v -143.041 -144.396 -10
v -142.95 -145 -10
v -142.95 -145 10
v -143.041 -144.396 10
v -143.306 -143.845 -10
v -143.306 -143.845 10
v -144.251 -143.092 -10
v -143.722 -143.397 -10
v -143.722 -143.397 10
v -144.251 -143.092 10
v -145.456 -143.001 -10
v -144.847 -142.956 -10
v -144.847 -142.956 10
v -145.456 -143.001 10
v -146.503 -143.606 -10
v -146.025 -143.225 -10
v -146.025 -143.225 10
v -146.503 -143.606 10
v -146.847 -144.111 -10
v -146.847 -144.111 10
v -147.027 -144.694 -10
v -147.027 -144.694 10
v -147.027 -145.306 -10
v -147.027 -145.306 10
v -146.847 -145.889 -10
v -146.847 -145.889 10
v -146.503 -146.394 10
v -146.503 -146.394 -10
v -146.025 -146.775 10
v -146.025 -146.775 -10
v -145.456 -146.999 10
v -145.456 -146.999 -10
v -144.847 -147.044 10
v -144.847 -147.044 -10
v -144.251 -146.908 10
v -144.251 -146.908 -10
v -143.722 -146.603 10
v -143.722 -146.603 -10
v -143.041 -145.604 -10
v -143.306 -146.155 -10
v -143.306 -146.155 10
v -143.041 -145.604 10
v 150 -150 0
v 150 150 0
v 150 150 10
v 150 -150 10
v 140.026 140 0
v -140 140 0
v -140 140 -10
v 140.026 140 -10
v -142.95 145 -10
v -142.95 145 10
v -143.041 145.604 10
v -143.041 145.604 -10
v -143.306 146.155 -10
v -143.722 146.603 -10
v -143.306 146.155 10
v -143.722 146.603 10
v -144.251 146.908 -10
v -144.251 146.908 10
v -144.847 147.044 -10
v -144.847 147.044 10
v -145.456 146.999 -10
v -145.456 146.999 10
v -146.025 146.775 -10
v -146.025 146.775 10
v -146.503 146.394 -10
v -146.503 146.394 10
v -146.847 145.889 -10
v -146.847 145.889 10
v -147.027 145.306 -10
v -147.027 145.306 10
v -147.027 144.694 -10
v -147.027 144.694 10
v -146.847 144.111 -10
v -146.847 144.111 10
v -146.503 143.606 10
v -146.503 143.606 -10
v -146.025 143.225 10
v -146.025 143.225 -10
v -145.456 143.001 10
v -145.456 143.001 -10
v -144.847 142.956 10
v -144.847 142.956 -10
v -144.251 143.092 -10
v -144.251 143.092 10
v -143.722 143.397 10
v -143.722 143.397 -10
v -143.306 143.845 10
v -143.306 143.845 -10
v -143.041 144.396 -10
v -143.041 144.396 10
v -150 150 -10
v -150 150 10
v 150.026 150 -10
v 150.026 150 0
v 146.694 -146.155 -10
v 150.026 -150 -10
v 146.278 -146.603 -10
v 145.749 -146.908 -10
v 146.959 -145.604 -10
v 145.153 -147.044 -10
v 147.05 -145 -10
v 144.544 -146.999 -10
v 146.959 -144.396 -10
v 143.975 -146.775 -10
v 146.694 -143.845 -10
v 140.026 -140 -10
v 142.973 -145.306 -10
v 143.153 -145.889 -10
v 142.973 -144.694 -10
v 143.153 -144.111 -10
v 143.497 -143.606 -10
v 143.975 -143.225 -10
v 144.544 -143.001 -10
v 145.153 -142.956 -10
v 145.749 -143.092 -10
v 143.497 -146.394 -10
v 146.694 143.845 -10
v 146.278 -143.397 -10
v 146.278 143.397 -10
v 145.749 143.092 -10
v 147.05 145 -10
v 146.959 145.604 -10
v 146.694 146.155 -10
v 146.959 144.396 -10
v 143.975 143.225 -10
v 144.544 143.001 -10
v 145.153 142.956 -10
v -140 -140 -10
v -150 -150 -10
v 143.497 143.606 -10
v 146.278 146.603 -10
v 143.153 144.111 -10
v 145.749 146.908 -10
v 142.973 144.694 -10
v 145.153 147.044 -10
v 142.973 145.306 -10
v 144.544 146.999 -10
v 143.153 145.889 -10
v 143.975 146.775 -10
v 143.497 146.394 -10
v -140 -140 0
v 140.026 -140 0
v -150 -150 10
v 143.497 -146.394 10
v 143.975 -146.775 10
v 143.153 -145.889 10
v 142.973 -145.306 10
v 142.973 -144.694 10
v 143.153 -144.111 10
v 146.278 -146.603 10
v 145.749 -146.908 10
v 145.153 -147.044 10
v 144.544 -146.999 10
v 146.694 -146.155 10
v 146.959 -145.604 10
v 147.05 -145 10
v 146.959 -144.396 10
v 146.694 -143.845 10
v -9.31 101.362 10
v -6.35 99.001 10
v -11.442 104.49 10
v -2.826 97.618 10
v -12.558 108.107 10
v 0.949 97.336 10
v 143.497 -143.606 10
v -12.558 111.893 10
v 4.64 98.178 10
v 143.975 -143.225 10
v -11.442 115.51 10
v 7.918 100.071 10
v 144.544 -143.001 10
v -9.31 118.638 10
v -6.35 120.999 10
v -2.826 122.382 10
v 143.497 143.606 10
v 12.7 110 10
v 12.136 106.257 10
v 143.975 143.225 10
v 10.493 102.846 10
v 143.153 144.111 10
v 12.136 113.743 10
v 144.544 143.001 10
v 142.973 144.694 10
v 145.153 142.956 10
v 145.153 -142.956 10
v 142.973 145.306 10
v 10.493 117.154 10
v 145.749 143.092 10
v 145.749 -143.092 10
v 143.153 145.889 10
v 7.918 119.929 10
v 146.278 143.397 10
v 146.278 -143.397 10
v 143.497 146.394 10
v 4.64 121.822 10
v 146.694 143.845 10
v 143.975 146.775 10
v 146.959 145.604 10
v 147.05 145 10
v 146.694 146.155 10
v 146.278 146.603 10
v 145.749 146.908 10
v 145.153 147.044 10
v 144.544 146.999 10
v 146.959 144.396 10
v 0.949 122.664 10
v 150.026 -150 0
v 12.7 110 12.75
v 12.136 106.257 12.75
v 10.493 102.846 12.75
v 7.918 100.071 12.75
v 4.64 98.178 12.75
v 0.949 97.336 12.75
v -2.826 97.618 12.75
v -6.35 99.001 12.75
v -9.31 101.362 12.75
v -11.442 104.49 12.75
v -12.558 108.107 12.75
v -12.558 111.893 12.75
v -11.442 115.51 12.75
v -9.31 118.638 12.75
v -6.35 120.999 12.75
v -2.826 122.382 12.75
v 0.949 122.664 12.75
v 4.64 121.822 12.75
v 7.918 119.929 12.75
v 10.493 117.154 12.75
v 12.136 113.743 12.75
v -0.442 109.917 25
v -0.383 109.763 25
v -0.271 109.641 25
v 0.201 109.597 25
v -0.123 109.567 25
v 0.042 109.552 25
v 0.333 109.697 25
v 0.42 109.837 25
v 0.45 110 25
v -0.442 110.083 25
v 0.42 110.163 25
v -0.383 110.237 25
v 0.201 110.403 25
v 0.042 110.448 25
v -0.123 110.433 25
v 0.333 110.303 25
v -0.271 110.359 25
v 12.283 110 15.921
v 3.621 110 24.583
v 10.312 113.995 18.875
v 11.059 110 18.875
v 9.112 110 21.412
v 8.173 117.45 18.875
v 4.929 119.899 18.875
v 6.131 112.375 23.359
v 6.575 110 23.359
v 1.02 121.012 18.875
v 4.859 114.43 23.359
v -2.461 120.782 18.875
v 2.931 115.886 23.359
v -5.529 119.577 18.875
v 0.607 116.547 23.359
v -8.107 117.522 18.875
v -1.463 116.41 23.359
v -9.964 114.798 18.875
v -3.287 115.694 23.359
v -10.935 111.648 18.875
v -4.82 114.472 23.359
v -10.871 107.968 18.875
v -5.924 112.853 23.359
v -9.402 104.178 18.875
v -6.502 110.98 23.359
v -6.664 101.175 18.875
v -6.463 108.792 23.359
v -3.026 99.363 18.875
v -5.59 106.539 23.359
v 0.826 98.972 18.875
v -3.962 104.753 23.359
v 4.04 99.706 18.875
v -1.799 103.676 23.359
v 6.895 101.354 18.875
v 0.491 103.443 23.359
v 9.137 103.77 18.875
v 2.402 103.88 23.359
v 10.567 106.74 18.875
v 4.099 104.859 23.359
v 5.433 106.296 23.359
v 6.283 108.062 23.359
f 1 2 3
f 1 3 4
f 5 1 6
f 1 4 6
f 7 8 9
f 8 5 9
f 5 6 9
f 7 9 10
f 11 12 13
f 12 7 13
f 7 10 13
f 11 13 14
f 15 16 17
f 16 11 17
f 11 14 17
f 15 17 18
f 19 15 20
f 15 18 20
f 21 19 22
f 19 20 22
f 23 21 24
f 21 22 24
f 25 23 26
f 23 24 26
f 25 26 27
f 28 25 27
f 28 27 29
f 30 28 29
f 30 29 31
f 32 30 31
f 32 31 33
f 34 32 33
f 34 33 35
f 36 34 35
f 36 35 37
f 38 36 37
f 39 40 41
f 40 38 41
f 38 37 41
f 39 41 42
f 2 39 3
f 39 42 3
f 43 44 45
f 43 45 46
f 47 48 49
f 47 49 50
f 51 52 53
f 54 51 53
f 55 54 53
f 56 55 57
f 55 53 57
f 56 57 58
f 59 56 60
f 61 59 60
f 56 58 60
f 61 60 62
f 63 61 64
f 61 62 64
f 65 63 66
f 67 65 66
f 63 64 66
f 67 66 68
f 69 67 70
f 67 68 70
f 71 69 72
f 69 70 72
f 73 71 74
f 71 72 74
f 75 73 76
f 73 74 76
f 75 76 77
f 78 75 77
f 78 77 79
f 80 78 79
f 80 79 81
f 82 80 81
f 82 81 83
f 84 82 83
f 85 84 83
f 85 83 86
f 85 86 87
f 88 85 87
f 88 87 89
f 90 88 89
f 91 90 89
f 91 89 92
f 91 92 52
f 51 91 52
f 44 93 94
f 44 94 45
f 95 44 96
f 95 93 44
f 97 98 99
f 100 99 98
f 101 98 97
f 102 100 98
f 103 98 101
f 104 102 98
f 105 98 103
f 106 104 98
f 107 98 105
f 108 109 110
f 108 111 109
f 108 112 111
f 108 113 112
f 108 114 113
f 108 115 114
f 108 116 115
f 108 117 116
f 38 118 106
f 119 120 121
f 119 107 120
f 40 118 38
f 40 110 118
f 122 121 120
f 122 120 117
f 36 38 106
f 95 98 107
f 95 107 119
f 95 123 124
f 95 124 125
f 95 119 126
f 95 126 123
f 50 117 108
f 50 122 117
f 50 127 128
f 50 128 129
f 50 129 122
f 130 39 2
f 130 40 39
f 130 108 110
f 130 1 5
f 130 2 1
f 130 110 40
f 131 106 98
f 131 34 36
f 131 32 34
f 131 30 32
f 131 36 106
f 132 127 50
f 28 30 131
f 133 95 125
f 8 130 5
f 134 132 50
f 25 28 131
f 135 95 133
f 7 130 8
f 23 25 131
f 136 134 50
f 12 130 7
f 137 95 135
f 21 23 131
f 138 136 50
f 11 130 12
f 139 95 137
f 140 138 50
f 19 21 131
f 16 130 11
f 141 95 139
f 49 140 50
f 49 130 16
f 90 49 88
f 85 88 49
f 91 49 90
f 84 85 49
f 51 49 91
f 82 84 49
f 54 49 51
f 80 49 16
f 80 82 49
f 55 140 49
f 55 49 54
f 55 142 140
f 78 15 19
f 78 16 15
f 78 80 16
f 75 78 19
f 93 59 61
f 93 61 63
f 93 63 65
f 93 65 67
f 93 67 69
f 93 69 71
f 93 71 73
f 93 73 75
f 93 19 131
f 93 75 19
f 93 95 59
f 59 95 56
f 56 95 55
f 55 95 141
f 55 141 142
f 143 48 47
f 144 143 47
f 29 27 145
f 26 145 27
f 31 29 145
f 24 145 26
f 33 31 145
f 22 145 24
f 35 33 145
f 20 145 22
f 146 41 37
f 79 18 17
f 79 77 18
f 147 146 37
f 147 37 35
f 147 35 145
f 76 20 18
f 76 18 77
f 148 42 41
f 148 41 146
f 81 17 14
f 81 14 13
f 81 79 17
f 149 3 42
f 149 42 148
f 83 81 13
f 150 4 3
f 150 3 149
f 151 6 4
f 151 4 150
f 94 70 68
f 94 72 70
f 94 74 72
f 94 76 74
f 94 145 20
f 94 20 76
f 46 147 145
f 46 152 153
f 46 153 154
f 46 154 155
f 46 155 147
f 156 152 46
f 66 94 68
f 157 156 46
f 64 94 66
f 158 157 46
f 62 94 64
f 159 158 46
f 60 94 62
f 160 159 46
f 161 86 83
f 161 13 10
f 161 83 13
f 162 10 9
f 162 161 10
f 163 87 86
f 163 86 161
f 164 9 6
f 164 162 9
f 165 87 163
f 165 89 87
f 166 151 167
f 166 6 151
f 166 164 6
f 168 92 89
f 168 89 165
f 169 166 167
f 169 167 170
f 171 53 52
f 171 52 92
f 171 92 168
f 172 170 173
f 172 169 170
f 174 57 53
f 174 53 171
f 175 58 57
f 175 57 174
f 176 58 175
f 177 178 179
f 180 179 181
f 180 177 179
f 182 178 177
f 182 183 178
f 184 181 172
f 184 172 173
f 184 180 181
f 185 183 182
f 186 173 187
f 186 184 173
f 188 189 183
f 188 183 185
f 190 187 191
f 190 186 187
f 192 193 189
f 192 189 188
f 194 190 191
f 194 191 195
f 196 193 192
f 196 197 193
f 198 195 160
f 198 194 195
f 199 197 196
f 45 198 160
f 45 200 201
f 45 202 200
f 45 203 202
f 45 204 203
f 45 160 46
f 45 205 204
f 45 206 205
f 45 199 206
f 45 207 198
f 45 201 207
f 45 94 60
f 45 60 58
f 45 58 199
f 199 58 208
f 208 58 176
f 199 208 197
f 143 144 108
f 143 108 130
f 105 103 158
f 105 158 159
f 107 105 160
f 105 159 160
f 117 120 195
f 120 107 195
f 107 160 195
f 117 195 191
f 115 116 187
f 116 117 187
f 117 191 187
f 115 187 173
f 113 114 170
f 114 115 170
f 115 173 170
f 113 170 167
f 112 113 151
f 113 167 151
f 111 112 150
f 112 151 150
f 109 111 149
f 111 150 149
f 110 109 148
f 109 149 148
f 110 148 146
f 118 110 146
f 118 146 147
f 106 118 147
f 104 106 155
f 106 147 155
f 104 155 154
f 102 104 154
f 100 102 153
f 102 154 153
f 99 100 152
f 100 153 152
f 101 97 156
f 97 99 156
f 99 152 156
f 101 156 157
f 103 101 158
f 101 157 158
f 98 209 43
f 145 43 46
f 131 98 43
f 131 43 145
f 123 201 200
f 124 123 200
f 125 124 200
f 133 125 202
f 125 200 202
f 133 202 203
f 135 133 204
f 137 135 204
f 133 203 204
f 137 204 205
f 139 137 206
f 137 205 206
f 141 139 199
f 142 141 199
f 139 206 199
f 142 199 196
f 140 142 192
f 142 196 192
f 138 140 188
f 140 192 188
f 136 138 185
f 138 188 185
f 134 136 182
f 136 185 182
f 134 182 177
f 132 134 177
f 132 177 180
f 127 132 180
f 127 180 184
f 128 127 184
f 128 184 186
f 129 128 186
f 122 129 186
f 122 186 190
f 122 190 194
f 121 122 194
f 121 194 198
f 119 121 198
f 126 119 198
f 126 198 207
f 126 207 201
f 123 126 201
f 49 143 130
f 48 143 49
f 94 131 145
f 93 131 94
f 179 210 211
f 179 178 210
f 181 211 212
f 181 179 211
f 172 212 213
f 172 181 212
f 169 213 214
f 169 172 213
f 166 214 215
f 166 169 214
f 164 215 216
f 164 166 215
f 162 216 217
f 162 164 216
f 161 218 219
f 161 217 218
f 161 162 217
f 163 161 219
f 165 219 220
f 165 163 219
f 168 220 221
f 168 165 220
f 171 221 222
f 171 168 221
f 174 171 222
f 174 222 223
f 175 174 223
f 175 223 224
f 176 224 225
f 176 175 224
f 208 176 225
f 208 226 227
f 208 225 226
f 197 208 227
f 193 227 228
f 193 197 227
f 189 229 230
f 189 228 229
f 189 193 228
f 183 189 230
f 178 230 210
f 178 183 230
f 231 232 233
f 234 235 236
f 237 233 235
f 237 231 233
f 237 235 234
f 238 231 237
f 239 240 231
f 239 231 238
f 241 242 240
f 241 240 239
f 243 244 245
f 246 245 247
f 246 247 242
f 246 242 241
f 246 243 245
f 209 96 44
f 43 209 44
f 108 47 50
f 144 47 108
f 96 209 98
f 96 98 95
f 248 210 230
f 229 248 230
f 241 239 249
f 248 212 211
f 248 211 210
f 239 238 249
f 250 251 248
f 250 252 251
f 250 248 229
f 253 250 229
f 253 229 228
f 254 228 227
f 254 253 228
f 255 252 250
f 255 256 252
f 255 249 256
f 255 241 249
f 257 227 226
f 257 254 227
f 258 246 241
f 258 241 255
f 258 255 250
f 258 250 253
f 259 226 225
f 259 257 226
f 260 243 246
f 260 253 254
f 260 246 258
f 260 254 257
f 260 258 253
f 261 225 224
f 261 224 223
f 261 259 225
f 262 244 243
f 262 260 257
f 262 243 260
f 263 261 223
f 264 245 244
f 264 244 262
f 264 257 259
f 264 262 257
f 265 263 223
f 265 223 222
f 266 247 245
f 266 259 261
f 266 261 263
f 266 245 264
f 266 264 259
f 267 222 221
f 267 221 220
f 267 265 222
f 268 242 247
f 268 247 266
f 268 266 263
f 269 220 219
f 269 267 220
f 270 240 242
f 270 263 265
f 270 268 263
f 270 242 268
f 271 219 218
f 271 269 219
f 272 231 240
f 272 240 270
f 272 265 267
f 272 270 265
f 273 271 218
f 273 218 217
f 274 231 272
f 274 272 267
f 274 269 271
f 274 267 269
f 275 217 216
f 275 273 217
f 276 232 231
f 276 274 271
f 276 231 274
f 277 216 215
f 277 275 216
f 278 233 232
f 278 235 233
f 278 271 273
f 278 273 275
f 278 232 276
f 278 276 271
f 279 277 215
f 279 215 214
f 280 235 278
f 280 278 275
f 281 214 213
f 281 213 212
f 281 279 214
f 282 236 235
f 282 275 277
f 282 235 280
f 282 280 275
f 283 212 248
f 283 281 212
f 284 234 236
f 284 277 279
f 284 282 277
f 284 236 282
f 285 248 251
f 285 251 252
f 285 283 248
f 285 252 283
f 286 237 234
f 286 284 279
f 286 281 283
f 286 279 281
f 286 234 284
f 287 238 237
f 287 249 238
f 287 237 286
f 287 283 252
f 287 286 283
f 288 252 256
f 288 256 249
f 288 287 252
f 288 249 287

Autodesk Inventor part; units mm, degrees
ref_plane "YZ Plane" through (0, 0, 0) normal (1, 0, 0) x (0, 1, 0)
ref_plane "XZ Plane" through (0, 0, 0) normal (0, 1, 0) x (-1, 0, 0)
ref_plane "XY Plane" through (0, 0, 0) normal (0, 0, 1) x (1, 0, 0)
sketch "Sketch1" plane through (0, 0, 0) normal (0, 0, 1) x (1, 0, 0)
  line L0 (-150, 150) -> (150, 150)
  line L1 (150, 150) -> (150, -150)
  line L2 (150, -150) -> (-150, -150)
  line L3 (-150, -150) -> (-150, 150)
  point P0 (0, 0)
  point P1 (0, 150)
  point P2 (150, 0)
  dimension "d0" = 300
  dimension "d1" = 300
extrude "Extrusion1" add sketch "Sketch1" along normal blind 10
sketch "Sketch2" plane through (0, 0, 0) normal (0, 0, -1) x (-1, 0, 0)
  line L0 (150, -150) -> (-150.0258, -150)
  line L1 (-150.0258, -150) -> (-150.0258, 150)
  line L2 (-150.0258, 150) -> (150, 150)
  line L3 (150, 150) -> (150, -150)
  line L4 (-140.0258, -140) -> (140, -140)
  line L5 (140, -140) -> (140, 140)
  line L6 (140, 140) -> (-140.0258, 140)
  line L7 (-140.0258, 140) -> (-140.0258, -140)
  point P0 (0, 0)
  dimension "d4" = 10
extrude "Extrusion2" add sketch "Sketch2" along normal blind 10
sketch "Sketch3" plane through (0, 0, 10) normal (0, 0, 1) x (1, 0, 0)
  circle A0 centre (-145, 145) radius 2.05
  circle A1 centre (145, 145) radius 2.05
  line L0 (-145, 145) -> (145, 145) construction
  line L1 (150, 150) -> (-150, 150) construction
  line L2 (-150, 150) -> (-150, -150) construction
  point P0 (0, 0)
  point P1 (0, 145)
  point P2 (0, 150)
  dimension "d7" = 5
  dimension "d8" = 4.1
  dimension "d9" = 4.1
  dimension "d10" = 5
extrude "Extrusion3" cut sketch "Sketch3" against normal up to surface (20 mm away)
mirror "Mirror1" about plane through (0, 0, 0) normal (0, 1, 0) of "Extrusion3"
sketch "Sketch4" plane through (0, 0, 10) normal (0, 0, 1) x (1, 0, 0)
  circle A0 centre (0, 110) radius 12.7
  point P0 (0, 0)
  dimension "d13" = 25.4
  dimension "d17" = 110
extrude "Extrusion4" add sketch "Sketch4" along normal blind 15
fillet "Fillet1" radius 12.25 1 edges at (-12.7, 110, 25)
properties part number "locomotion top"
